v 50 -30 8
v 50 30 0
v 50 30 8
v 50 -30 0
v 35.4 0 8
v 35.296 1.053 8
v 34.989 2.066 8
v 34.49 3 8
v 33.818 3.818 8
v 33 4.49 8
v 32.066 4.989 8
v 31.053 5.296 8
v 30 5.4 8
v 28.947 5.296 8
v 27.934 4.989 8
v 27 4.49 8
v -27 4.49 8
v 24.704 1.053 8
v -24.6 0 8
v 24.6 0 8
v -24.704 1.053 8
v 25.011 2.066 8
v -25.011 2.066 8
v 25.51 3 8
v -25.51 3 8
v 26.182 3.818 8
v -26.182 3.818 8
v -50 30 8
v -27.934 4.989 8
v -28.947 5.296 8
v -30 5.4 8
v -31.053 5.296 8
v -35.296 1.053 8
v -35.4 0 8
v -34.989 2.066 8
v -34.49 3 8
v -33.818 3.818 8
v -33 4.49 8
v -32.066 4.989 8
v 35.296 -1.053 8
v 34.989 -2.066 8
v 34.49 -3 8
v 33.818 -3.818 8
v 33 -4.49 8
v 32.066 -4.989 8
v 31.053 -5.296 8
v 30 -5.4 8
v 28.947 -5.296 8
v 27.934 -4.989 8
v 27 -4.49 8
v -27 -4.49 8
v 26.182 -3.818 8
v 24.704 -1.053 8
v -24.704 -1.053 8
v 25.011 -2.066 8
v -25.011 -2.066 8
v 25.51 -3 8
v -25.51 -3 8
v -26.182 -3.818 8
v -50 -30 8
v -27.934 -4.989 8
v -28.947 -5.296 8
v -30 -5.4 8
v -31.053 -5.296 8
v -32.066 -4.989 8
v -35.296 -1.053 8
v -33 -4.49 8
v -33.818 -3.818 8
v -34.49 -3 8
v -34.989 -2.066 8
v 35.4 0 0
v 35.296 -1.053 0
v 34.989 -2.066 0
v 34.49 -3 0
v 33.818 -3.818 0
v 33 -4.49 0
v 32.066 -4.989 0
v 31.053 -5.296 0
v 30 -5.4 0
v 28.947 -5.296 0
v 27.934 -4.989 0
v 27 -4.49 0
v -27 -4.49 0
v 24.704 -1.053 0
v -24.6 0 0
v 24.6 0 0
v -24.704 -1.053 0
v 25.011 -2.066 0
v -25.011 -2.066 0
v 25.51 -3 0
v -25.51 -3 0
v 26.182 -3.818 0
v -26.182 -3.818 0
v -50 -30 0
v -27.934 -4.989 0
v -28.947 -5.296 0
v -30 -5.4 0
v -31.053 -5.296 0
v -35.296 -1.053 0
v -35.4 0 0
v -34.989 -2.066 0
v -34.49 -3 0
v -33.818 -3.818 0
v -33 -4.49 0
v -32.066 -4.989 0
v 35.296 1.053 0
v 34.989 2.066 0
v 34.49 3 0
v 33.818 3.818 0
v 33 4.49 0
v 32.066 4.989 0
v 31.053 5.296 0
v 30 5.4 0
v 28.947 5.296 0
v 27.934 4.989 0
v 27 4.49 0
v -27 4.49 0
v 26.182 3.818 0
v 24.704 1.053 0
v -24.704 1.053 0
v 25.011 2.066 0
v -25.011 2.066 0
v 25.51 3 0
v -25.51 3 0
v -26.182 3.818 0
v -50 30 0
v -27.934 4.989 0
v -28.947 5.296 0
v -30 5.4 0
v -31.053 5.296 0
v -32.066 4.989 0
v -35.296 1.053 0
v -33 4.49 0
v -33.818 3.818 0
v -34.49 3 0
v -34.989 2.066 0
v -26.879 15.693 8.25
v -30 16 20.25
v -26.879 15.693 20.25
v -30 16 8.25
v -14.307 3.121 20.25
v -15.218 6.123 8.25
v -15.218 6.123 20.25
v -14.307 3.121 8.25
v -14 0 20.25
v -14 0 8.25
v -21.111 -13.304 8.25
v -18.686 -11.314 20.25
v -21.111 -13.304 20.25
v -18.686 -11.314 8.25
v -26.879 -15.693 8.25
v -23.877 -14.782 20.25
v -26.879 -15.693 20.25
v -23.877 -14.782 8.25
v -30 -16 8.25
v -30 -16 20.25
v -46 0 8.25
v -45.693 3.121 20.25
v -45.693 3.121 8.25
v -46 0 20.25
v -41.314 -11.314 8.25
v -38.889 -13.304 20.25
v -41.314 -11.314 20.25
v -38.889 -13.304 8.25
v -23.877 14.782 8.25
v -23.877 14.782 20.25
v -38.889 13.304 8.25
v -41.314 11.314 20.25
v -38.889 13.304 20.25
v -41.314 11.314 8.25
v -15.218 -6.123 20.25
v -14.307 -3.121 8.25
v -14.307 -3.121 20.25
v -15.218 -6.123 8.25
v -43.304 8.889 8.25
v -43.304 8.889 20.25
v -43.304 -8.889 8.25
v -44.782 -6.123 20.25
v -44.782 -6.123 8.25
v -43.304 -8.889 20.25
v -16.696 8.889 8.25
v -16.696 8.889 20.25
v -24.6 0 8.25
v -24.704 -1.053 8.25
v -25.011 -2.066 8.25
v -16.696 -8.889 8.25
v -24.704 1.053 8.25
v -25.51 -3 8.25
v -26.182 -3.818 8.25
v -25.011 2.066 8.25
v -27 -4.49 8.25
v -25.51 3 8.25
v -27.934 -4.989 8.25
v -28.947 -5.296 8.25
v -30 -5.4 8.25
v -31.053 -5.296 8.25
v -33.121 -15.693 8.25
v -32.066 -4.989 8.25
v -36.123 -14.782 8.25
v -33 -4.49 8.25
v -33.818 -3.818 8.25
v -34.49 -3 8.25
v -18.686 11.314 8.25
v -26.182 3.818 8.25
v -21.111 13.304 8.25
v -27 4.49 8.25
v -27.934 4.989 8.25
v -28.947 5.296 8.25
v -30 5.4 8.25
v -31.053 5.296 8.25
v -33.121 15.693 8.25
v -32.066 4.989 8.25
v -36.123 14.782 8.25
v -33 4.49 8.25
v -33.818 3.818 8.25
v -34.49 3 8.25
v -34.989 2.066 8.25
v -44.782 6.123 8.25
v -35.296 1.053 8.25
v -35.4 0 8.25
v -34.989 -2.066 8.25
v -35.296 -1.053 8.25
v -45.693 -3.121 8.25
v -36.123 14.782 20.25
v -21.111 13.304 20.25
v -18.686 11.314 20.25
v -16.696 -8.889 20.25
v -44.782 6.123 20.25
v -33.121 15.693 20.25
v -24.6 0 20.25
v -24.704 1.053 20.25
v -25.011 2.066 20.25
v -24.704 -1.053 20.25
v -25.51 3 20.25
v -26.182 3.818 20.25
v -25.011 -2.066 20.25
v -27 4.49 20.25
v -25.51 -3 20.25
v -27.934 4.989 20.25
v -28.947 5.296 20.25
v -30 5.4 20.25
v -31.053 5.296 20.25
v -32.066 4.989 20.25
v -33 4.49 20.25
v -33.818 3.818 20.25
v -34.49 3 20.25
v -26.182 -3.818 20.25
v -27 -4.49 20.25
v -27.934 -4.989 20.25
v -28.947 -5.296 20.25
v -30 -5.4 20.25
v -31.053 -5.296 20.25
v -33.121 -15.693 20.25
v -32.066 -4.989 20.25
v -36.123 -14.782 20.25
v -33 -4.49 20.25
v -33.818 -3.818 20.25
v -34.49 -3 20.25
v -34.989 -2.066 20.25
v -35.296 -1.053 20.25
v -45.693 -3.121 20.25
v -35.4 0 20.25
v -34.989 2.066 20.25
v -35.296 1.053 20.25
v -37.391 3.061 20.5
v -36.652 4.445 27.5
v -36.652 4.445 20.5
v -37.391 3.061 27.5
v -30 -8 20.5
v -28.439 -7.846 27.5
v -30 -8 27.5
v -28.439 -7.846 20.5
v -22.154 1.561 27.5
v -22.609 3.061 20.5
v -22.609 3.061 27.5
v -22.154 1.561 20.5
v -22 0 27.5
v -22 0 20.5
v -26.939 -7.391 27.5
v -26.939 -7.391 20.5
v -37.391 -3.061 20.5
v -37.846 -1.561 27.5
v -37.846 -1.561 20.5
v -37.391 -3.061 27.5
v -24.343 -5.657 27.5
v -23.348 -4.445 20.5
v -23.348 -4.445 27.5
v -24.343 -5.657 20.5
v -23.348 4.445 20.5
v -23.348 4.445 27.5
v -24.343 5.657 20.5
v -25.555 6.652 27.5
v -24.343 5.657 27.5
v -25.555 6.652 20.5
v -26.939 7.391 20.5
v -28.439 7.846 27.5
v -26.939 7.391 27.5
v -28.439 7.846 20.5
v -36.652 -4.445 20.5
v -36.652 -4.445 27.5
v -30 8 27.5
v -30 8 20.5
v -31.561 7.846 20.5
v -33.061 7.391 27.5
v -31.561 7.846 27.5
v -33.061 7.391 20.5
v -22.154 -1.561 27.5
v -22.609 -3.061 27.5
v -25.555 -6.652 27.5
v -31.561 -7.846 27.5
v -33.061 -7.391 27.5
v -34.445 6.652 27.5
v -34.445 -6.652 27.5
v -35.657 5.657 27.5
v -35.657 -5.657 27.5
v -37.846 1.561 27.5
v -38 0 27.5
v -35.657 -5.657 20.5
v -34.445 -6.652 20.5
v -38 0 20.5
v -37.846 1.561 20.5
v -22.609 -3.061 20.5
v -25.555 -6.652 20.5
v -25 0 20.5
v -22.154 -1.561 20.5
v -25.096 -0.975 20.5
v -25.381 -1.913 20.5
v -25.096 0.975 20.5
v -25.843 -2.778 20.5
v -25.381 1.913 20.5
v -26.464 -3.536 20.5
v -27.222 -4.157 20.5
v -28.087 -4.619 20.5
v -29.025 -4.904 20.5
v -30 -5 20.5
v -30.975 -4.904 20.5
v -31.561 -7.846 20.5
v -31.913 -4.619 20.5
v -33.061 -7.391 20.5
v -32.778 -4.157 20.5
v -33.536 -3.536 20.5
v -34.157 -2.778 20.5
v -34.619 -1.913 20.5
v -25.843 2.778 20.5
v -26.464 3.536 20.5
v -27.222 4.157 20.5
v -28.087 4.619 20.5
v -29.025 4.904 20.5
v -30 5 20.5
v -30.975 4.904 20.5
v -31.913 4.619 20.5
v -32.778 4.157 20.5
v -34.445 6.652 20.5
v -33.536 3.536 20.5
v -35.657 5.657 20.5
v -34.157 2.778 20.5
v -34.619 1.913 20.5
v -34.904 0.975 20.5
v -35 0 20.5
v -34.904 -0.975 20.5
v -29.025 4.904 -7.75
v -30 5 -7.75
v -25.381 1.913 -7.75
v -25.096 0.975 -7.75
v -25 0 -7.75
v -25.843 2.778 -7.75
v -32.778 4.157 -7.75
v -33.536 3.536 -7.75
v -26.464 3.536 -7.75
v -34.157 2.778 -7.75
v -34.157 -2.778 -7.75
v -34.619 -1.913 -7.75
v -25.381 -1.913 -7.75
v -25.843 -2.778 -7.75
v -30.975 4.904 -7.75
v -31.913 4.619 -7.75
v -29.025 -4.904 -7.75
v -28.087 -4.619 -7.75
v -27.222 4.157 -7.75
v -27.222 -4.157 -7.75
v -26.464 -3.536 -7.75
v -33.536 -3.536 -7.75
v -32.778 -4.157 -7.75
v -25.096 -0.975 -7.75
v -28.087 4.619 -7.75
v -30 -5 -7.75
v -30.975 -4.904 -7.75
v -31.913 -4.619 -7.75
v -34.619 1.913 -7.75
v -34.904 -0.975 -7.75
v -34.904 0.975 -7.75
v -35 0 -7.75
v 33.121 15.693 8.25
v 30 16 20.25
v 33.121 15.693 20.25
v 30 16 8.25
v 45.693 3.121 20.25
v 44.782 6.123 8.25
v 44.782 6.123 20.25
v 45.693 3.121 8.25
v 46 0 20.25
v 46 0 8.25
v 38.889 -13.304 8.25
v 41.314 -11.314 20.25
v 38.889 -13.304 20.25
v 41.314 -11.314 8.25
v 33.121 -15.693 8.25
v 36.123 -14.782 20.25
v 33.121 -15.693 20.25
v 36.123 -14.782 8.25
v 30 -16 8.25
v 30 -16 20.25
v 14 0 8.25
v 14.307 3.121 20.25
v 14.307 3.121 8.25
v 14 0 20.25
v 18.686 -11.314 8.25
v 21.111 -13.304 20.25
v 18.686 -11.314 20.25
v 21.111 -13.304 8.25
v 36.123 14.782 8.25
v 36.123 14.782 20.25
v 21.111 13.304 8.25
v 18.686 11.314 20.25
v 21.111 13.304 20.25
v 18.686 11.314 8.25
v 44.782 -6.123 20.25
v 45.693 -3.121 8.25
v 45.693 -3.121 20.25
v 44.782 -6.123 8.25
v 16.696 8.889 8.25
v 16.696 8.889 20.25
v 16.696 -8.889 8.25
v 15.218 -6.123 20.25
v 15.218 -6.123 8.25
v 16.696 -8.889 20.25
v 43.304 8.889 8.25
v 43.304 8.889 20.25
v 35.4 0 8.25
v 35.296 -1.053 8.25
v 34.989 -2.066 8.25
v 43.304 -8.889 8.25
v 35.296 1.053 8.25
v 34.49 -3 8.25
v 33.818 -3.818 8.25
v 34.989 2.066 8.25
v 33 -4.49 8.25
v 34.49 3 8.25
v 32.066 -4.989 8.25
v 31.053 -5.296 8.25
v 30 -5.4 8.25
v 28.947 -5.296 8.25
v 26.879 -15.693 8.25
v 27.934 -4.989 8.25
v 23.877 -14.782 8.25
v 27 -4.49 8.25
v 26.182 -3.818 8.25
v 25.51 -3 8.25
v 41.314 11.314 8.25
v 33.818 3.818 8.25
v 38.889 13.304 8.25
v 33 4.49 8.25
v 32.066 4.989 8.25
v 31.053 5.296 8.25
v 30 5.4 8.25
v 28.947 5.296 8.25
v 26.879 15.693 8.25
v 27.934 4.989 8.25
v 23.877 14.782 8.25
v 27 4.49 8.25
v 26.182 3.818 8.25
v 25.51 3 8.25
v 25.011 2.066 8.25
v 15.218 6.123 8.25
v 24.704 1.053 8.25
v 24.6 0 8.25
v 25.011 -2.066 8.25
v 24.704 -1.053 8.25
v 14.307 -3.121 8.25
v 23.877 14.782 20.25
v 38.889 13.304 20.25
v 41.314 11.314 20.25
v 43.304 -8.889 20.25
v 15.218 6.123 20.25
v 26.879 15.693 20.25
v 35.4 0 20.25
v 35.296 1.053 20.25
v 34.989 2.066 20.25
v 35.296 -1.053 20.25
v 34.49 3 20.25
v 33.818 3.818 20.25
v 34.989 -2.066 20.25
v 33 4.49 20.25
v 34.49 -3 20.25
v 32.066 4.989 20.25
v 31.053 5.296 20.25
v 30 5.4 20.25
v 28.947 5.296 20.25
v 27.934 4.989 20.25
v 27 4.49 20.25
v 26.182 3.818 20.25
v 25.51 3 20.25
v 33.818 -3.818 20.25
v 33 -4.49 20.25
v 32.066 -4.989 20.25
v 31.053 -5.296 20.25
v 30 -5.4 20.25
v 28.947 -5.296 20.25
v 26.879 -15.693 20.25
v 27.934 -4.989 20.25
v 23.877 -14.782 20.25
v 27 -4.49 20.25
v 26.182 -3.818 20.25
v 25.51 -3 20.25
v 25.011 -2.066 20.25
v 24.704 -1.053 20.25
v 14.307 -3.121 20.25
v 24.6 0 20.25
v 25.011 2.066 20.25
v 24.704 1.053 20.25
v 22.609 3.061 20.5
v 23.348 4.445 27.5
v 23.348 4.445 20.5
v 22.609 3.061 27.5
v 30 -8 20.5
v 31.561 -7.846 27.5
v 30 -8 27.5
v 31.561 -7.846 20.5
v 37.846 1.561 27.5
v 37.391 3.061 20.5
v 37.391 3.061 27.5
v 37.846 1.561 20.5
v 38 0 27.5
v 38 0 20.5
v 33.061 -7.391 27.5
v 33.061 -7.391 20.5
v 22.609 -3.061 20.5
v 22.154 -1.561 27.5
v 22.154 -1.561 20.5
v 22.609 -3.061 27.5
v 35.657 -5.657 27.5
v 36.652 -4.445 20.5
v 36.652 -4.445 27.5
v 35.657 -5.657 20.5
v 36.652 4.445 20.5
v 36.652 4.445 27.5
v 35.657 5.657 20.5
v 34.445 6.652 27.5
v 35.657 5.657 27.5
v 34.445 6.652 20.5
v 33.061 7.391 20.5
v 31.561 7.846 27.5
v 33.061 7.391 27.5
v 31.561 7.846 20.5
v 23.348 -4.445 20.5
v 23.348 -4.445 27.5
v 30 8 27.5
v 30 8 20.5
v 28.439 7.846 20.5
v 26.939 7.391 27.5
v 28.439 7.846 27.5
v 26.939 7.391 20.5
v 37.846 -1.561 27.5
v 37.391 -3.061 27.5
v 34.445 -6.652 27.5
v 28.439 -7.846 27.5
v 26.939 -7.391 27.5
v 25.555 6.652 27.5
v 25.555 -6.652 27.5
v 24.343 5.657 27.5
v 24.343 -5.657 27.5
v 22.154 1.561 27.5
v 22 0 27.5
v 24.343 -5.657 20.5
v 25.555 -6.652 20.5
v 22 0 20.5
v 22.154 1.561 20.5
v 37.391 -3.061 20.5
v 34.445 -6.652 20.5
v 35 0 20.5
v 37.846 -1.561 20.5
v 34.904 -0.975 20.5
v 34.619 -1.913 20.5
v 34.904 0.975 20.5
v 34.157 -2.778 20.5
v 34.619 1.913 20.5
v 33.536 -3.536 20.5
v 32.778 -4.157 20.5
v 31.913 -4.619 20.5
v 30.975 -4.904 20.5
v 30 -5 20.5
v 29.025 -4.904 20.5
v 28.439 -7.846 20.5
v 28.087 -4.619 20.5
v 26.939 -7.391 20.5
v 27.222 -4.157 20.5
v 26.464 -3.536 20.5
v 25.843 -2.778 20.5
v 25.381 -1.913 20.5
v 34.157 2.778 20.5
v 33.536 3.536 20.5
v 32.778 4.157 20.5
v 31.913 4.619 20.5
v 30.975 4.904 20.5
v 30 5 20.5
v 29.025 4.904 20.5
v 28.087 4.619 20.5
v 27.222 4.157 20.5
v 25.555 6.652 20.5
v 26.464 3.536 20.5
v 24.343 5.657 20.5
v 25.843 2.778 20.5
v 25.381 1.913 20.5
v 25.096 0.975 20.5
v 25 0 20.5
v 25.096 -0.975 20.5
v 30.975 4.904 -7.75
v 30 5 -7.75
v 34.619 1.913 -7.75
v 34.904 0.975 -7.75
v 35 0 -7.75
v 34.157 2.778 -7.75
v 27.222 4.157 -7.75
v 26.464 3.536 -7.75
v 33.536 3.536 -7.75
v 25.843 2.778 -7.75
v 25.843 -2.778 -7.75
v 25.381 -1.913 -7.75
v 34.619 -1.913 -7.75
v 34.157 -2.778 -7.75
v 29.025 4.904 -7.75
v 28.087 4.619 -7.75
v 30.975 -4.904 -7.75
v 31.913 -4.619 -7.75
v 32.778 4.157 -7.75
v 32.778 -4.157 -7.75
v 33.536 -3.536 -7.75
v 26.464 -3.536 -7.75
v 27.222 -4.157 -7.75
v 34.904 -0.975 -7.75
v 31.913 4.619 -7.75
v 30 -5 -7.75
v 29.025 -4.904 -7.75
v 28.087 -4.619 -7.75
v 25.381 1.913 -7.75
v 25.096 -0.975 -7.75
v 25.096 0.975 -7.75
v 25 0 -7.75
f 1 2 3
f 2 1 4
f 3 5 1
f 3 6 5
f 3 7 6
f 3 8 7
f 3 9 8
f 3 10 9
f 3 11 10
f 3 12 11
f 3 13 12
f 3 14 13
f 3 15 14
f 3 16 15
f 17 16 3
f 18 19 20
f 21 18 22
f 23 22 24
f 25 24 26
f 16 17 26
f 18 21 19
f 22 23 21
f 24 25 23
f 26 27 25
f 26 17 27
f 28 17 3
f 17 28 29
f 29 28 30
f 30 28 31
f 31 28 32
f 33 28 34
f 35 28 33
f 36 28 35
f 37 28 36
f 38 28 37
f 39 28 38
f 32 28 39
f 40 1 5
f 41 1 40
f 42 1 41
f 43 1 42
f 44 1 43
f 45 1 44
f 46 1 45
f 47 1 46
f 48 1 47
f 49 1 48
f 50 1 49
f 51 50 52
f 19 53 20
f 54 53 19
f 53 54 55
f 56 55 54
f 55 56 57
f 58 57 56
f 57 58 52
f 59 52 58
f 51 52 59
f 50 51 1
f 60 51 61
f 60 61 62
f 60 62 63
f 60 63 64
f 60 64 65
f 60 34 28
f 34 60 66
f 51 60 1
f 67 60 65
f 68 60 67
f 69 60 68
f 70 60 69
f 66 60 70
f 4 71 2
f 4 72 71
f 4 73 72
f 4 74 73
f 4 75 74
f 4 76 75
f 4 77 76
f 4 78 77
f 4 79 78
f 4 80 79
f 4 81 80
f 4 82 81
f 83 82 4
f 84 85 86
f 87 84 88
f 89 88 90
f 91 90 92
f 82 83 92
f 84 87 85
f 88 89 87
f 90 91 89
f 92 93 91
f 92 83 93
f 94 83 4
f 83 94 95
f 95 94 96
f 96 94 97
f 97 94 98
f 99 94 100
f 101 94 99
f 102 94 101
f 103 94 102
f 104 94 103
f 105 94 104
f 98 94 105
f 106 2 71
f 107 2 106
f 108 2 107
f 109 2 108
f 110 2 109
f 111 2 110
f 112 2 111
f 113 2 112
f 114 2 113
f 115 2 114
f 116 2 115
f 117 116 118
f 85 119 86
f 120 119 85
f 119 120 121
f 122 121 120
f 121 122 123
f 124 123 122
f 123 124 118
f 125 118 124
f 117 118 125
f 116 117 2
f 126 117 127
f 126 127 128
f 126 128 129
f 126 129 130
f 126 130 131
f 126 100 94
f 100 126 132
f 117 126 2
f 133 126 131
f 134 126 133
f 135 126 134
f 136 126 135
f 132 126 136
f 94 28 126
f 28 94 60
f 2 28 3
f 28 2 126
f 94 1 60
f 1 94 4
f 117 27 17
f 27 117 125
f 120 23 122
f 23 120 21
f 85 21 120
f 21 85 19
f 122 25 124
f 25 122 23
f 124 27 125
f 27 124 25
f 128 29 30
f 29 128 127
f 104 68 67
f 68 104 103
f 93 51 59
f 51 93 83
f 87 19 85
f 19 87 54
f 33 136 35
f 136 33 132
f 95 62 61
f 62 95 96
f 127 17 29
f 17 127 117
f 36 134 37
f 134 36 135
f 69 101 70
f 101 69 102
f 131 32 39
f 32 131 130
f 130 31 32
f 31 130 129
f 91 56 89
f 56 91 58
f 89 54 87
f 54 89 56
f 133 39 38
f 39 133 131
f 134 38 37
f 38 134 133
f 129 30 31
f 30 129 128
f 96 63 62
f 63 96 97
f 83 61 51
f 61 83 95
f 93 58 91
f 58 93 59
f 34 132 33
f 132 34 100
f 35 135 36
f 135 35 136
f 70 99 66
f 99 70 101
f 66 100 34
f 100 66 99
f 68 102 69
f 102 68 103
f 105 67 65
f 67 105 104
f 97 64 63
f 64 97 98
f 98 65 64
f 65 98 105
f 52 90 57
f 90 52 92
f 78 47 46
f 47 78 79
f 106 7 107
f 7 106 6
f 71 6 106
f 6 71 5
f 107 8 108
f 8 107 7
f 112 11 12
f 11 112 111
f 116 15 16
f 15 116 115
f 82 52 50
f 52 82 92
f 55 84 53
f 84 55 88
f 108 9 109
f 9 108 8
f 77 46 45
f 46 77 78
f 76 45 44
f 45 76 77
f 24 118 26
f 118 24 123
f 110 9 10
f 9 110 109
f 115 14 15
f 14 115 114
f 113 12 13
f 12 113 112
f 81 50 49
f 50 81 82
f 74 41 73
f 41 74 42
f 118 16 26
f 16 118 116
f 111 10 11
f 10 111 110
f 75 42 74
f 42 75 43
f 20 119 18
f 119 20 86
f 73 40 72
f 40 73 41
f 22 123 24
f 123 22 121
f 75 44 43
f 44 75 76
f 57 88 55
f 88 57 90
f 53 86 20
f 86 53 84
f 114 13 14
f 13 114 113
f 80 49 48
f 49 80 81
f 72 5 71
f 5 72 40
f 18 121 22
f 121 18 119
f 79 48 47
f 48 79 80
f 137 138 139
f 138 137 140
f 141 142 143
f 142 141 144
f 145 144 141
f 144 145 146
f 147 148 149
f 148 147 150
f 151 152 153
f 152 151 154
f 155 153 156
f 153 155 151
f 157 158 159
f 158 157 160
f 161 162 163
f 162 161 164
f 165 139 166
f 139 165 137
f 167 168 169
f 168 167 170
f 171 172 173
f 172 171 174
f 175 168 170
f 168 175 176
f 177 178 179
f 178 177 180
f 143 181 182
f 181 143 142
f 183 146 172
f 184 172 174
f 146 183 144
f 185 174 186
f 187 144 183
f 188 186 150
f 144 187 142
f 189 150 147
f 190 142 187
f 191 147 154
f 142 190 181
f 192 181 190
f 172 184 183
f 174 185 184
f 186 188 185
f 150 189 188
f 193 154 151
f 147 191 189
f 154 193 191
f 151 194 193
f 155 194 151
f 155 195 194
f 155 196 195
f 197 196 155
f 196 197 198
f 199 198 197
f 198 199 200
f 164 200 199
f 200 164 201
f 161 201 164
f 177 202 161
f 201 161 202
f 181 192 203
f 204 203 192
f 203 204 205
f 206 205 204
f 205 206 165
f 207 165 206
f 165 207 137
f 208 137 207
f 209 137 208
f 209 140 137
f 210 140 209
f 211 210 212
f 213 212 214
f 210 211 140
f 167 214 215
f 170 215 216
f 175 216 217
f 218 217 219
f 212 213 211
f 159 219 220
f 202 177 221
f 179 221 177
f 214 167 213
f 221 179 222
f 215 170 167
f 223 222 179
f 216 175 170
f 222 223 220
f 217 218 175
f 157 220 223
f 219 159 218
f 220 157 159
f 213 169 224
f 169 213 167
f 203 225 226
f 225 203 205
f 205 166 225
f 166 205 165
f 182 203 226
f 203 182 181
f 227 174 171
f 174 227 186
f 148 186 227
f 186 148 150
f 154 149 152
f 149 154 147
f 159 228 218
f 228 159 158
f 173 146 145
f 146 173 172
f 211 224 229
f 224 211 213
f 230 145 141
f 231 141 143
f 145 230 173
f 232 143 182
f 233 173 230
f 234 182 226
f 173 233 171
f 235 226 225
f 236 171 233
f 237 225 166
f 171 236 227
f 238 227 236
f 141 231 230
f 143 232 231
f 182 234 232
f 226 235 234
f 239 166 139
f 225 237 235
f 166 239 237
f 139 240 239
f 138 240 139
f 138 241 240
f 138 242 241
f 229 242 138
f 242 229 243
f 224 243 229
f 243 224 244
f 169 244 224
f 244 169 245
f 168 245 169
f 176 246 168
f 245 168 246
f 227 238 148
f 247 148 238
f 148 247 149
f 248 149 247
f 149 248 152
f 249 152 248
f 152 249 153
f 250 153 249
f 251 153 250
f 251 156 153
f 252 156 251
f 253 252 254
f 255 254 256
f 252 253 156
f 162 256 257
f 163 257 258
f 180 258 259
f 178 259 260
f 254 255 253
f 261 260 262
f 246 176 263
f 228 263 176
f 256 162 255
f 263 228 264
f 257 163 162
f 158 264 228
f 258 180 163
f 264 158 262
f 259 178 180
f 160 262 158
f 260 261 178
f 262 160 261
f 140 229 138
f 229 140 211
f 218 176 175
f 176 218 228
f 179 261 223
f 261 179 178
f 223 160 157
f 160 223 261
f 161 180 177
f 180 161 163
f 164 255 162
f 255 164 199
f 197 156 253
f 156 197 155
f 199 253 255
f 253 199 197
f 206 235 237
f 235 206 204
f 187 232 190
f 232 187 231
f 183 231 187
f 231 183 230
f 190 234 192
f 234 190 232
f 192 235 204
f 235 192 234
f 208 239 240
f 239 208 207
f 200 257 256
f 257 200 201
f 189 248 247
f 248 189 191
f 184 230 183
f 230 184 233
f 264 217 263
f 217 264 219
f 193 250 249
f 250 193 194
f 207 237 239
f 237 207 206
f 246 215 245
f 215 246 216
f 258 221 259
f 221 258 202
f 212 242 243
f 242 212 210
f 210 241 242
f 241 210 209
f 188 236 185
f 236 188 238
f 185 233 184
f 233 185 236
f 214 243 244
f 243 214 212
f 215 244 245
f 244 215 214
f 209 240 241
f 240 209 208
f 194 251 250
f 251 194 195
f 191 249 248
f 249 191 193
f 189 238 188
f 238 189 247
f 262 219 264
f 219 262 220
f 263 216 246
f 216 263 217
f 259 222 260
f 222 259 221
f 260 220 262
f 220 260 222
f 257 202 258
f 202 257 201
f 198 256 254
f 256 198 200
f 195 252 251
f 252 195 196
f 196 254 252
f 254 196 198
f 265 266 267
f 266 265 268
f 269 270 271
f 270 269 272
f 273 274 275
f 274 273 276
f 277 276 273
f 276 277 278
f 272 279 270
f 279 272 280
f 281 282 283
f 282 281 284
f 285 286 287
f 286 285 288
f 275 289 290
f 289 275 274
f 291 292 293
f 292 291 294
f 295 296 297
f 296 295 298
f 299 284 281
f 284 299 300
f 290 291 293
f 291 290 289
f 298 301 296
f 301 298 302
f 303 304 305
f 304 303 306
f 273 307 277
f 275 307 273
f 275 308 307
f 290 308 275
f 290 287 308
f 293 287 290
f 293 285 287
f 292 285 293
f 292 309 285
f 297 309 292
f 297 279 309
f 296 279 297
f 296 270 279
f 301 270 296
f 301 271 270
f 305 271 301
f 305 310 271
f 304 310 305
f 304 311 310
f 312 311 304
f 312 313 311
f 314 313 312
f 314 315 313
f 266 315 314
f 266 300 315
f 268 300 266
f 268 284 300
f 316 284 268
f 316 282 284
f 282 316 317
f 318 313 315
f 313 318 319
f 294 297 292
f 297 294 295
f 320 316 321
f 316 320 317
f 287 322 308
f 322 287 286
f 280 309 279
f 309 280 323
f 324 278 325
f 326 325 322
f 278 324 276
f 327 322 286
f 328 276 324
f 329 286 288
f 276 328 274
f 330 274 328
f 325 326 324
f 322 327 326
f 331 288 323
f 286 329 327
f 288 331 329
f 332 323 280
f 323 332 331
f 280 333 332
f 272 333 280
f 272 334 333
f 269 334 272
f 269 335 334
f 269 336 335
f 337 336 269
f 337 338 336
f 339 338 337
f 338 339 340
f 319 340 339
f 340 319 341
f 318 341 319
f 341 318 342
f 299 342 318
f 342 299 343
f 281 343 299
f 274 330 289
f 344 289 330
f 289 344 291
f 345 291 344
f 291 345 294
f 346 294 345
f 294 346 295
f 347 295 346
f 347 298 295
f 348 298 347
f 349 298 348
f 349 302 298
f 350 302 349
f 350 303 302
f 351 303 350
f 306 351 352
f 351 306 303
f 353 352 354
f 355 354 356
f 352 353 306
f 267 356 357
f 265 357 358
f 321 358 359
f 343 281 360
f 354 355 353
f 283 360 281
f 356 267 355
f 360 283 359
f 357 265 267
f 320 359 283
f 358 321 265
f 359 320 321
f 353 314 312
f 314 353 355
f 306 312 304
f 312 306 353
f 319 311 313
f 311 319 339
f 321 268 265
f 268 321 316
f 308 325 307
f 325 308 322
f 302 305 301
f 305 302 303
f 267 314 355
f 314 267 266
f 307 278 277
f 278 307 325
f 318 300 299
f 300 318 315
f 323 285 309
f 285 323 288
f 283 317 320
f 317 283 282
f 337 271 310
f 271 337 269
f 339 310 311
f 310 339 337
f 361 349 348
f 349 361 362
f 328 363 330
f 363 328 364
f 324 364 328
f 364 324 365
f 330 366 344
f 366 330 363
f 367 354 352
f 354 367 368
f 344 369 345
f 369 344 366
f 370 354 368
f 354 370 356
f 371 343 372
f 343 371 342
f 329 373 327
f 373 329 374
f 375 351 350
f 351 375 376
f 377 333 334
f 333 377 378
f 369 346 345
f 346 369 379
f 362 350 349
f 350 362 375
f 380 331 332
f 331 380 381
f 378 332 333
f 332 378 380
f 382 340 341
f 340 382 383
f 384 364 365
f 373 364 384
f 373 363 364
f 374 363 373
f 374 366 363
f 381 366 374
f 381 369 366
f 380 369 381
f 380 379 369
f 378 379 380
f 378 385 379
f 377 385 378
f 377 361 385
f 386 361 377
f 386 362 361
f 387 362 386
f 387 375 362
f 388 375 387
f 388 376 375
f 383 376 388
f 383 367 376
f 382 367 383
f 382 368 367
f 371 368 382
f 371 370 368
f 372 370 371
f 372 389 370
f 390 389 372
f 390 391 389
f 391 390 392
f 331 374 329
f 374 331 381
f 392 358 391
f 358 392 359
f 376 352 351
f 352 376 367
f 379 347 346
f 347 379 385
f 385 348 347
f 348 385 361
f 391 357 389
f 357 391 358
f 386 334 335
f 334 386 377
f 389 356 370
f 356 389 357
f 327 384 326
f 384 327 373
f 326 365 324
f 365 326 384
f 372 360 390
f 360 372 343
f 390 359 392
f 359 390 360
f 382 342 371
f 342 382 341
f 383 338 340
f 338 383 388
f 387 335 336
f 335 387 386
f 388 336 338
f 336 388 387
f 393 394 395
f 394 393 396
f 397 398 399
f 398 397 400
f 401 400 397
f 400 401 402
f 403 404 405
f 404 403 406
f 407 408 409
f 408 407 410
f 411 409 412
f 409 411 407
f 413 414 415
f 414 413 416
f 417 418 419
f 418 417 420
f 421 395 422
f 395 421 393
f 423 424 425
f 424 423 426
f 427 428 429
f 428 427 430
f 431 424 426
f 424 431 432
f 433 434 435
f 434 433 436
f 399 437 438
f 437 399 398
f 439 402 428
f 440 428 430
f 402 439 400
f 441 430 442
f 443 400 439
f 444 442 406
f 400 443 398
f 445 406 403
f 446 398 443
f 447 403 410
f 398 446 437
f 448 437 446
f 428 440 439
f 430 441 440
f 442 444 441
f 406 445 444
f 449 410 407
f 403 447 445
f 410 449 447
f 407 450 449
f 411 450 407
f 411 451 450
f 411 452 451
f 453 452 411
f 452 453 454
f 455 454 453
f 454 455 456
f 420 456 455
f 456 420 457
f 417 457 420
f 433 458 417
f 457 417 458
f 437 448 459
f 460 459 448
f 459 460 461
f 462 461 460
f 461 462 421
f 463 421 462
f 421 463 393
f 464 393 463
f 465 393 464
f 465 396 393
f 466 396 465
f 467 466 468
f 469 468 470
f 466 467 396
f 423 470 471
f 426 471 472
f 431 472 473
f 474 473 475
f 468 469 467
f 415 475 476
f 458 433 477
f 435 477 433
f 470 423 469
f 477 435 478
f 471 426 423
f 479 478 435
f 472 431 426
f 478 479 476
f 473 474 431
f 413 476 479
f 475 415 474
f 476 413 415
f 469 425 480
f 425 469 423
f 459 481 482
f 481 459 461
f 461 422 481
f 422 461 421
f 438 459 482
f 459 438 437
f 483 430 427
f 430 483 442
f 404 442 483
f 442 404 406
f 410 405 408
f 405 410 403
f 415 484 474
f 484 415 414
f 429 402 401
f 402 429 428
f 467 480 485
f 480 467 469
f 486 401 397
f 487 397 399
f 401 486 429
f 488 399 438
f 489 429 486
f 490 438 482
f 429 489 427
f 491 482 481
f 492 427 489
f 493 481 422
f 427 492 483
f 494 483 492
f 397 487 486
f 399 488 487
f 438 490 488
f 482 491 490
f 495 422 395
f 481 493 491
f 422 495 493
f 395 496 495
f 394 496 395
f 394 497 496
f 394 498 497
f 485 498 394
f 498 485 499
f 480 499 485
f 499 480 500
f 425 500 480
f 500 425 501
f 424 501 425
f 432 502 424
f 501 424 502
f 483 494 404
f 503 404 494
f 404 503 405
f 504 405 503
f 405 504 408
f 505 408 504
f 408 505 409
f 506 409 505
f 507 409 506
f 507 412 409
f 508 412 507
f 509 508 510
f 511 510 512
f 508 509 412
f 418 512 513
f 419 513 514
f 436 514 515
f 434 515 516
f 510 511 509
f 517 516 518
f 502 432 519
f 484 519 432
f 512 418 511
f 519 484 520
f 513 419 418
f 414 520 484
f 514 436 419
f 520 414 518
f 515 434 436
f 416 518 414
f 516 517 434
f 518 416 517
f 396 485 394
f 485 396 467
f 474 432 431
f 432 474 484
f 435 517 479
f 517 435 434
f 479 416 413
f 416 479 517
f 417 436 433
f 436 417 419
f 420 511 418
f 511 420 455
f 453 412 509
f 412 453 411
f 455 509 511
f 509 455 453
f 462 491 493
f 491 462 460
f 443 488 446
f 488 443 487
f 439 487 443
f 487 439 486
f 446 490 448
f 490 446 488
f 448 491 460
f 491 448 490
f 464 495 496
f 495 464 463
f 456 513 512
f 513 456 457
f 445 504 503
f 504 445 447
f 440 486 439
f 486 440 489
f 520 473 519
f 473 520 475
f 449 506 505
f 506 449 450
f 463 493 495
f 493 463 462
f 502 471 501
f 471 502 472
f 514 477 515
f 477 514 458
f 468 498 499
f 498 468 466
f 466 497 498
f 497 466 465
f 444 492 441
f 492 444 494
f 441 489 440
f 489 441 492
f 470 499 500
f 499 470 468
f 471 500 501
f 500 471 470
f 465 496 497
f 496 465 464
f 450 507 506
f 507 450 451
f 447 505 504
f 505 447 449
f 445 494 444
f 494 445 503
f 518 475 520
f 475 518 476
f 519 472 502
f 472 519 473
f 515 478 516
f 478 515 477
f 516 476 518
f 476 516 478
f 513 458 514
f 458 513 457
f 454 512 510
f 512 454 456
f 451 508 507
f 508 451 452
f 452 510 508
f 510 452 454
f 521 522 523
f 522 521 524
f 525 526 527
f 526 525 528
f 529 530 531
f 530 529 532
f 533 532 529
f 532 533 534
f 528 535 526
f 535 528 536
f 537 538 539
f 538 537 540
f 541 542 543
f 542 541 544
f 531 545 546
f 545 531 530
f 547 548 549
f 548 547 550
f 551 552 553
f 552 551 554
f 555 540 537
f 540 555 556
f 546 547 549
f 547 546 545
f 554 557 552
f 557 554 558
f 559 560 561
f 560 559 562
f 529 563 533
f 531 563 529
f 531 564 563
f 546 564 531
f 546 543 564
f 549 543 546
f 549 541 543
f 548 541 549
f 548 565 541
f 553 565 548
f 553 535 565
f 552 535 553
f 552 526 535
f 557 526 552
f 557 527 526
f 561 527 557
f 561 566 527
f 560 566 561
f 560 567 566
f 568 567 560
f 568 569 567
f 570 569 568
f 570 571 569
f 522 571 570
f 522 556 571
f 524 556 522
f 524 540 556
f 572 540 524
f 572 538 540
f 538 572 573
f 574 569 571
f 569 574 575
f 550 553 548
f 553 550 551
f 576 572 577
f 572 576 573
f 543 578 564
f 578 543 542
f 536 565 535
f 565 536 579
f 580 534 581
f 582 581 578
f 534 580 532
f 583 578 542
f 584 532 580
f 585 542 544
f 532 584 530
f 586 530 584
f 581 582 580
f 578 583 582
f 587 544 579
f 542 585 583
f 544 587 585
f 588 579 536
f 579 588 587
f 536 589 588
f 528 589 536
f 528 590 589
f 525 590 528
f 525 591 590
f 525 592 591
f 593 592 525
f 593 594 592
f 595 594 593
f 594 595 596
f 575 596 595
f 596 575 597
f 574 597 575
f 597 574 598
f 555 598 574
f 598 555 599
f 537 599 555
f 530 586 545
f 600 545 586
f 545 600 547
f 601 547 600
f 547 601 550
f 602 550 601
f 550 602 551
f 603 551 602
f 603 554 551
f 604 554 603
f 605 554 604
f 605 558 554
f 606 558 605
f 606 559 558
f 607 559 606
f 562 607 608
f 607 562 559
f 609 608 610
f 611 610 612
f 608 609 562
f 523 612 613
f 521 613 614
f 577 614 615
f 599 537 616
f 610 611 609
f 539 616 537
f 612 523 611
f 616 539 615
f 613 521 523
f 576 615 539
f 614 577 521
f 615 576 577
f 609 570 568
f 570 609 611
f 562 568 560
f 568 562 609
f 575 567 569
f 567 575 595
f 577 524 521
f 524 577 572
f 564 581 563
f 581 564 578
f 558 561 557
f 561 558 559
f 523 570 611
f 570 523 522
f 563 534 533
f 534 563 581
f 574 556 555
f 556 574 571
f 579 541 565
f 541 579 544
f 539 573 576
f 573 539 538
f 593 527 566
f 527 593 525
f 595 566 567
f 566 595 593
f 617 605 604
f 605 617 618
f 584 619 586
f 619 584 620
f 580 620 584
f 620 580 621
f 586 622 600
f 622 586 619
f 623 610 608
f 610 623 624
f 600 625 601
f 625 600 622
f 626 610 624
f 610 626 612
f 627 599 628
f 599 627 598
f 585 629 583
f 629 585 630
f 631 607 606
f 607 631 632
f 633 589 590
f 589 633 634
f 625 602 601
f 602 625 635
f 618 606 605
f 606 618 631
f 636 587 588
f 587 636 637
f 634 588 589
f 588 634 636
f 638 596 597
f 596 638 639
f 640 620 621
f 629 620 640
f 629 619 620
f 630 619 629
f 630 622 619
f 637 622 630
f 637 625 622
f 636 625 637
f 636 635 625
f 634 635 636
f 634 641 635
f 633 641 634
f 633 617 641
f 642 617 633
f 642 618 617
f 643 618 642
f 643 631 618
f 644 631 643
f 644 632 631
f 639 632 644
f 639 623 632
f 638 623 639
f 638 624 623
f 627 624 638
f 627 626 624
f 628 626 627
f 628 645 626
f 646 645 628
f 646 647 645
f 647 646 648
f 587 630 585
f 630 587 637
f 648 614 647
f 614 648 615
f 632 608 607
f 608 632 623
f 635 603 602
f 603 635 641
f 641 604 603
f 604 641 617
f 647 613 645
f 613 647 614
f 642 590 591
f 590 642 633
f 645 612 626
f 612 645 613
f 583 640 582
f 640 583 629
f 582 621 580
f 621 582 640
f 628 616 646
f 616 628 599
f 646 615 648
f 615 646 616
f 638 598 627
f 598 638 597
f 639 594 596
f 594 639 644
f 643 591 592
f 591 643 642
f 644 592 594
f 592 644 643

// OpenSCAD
$fn = 32;

// ------------------------------------------------------------------------
// Standoff columns: 2 d32 standoffs, bolts d10
// Every part is its own module, assembly() places them once.
// ------------------------------------------------------------------------

// --- part 1 ---
module base_plate() {
  difference() {
    translate([-50, -30, 0]) cube([100, 60, 8]);
    translate([-30, 0, -1]) cylinder(h = 10, d = 10.8);
    translate([30, 0, -1]) cylinder(h = 10, d = 10.8);
  }
}

// --- part 2 ---
module spacer1() {
  difference() {
      translate([0, 0, 0]) cylinder(h = 12, d = 32);
      translate([0, 0, -1]) cylinder(h = 14, d = 10.8);
    }
}

// --- part 3 ---
module bolt1() {
  cylinder(h = 7, d = 16);
  translate([0, 0, -28.25]) cylinder(h = 28.25, d = 10);
}

// --- part 4 ---
module spacer2() {
  difference() {
      translate([0, 0, 0]) cylinder(h = 12, d = 32);
      translate([0, 0, -1]) cylinder(h = 14, d = 10.8);
    }
}

// --- part 5 ---
module bolt2() {
  cylinder(h = 7, d = 16);
  translate([0, 0, -28.25]) cylinder(h = 28.25, d = 10);
}

// --- assembly ---
module assembly() {
  translate([0, 0, 0]) rotate([0, 0, 0]) base_plate();
  translate([-30, 0, 8.25]) rotate([0, 0, 0]) spacer1();
  translate([-30, 0, 20.5]) rotate([0, 0, 0]) bolt1();
  translate([30, 0, 8.25]) rotate([0, 0, 0]) spacer2();
  translate([30, 0, 20.5]) rotate([0, 0, 0]) bolt2();
}

assembly();
